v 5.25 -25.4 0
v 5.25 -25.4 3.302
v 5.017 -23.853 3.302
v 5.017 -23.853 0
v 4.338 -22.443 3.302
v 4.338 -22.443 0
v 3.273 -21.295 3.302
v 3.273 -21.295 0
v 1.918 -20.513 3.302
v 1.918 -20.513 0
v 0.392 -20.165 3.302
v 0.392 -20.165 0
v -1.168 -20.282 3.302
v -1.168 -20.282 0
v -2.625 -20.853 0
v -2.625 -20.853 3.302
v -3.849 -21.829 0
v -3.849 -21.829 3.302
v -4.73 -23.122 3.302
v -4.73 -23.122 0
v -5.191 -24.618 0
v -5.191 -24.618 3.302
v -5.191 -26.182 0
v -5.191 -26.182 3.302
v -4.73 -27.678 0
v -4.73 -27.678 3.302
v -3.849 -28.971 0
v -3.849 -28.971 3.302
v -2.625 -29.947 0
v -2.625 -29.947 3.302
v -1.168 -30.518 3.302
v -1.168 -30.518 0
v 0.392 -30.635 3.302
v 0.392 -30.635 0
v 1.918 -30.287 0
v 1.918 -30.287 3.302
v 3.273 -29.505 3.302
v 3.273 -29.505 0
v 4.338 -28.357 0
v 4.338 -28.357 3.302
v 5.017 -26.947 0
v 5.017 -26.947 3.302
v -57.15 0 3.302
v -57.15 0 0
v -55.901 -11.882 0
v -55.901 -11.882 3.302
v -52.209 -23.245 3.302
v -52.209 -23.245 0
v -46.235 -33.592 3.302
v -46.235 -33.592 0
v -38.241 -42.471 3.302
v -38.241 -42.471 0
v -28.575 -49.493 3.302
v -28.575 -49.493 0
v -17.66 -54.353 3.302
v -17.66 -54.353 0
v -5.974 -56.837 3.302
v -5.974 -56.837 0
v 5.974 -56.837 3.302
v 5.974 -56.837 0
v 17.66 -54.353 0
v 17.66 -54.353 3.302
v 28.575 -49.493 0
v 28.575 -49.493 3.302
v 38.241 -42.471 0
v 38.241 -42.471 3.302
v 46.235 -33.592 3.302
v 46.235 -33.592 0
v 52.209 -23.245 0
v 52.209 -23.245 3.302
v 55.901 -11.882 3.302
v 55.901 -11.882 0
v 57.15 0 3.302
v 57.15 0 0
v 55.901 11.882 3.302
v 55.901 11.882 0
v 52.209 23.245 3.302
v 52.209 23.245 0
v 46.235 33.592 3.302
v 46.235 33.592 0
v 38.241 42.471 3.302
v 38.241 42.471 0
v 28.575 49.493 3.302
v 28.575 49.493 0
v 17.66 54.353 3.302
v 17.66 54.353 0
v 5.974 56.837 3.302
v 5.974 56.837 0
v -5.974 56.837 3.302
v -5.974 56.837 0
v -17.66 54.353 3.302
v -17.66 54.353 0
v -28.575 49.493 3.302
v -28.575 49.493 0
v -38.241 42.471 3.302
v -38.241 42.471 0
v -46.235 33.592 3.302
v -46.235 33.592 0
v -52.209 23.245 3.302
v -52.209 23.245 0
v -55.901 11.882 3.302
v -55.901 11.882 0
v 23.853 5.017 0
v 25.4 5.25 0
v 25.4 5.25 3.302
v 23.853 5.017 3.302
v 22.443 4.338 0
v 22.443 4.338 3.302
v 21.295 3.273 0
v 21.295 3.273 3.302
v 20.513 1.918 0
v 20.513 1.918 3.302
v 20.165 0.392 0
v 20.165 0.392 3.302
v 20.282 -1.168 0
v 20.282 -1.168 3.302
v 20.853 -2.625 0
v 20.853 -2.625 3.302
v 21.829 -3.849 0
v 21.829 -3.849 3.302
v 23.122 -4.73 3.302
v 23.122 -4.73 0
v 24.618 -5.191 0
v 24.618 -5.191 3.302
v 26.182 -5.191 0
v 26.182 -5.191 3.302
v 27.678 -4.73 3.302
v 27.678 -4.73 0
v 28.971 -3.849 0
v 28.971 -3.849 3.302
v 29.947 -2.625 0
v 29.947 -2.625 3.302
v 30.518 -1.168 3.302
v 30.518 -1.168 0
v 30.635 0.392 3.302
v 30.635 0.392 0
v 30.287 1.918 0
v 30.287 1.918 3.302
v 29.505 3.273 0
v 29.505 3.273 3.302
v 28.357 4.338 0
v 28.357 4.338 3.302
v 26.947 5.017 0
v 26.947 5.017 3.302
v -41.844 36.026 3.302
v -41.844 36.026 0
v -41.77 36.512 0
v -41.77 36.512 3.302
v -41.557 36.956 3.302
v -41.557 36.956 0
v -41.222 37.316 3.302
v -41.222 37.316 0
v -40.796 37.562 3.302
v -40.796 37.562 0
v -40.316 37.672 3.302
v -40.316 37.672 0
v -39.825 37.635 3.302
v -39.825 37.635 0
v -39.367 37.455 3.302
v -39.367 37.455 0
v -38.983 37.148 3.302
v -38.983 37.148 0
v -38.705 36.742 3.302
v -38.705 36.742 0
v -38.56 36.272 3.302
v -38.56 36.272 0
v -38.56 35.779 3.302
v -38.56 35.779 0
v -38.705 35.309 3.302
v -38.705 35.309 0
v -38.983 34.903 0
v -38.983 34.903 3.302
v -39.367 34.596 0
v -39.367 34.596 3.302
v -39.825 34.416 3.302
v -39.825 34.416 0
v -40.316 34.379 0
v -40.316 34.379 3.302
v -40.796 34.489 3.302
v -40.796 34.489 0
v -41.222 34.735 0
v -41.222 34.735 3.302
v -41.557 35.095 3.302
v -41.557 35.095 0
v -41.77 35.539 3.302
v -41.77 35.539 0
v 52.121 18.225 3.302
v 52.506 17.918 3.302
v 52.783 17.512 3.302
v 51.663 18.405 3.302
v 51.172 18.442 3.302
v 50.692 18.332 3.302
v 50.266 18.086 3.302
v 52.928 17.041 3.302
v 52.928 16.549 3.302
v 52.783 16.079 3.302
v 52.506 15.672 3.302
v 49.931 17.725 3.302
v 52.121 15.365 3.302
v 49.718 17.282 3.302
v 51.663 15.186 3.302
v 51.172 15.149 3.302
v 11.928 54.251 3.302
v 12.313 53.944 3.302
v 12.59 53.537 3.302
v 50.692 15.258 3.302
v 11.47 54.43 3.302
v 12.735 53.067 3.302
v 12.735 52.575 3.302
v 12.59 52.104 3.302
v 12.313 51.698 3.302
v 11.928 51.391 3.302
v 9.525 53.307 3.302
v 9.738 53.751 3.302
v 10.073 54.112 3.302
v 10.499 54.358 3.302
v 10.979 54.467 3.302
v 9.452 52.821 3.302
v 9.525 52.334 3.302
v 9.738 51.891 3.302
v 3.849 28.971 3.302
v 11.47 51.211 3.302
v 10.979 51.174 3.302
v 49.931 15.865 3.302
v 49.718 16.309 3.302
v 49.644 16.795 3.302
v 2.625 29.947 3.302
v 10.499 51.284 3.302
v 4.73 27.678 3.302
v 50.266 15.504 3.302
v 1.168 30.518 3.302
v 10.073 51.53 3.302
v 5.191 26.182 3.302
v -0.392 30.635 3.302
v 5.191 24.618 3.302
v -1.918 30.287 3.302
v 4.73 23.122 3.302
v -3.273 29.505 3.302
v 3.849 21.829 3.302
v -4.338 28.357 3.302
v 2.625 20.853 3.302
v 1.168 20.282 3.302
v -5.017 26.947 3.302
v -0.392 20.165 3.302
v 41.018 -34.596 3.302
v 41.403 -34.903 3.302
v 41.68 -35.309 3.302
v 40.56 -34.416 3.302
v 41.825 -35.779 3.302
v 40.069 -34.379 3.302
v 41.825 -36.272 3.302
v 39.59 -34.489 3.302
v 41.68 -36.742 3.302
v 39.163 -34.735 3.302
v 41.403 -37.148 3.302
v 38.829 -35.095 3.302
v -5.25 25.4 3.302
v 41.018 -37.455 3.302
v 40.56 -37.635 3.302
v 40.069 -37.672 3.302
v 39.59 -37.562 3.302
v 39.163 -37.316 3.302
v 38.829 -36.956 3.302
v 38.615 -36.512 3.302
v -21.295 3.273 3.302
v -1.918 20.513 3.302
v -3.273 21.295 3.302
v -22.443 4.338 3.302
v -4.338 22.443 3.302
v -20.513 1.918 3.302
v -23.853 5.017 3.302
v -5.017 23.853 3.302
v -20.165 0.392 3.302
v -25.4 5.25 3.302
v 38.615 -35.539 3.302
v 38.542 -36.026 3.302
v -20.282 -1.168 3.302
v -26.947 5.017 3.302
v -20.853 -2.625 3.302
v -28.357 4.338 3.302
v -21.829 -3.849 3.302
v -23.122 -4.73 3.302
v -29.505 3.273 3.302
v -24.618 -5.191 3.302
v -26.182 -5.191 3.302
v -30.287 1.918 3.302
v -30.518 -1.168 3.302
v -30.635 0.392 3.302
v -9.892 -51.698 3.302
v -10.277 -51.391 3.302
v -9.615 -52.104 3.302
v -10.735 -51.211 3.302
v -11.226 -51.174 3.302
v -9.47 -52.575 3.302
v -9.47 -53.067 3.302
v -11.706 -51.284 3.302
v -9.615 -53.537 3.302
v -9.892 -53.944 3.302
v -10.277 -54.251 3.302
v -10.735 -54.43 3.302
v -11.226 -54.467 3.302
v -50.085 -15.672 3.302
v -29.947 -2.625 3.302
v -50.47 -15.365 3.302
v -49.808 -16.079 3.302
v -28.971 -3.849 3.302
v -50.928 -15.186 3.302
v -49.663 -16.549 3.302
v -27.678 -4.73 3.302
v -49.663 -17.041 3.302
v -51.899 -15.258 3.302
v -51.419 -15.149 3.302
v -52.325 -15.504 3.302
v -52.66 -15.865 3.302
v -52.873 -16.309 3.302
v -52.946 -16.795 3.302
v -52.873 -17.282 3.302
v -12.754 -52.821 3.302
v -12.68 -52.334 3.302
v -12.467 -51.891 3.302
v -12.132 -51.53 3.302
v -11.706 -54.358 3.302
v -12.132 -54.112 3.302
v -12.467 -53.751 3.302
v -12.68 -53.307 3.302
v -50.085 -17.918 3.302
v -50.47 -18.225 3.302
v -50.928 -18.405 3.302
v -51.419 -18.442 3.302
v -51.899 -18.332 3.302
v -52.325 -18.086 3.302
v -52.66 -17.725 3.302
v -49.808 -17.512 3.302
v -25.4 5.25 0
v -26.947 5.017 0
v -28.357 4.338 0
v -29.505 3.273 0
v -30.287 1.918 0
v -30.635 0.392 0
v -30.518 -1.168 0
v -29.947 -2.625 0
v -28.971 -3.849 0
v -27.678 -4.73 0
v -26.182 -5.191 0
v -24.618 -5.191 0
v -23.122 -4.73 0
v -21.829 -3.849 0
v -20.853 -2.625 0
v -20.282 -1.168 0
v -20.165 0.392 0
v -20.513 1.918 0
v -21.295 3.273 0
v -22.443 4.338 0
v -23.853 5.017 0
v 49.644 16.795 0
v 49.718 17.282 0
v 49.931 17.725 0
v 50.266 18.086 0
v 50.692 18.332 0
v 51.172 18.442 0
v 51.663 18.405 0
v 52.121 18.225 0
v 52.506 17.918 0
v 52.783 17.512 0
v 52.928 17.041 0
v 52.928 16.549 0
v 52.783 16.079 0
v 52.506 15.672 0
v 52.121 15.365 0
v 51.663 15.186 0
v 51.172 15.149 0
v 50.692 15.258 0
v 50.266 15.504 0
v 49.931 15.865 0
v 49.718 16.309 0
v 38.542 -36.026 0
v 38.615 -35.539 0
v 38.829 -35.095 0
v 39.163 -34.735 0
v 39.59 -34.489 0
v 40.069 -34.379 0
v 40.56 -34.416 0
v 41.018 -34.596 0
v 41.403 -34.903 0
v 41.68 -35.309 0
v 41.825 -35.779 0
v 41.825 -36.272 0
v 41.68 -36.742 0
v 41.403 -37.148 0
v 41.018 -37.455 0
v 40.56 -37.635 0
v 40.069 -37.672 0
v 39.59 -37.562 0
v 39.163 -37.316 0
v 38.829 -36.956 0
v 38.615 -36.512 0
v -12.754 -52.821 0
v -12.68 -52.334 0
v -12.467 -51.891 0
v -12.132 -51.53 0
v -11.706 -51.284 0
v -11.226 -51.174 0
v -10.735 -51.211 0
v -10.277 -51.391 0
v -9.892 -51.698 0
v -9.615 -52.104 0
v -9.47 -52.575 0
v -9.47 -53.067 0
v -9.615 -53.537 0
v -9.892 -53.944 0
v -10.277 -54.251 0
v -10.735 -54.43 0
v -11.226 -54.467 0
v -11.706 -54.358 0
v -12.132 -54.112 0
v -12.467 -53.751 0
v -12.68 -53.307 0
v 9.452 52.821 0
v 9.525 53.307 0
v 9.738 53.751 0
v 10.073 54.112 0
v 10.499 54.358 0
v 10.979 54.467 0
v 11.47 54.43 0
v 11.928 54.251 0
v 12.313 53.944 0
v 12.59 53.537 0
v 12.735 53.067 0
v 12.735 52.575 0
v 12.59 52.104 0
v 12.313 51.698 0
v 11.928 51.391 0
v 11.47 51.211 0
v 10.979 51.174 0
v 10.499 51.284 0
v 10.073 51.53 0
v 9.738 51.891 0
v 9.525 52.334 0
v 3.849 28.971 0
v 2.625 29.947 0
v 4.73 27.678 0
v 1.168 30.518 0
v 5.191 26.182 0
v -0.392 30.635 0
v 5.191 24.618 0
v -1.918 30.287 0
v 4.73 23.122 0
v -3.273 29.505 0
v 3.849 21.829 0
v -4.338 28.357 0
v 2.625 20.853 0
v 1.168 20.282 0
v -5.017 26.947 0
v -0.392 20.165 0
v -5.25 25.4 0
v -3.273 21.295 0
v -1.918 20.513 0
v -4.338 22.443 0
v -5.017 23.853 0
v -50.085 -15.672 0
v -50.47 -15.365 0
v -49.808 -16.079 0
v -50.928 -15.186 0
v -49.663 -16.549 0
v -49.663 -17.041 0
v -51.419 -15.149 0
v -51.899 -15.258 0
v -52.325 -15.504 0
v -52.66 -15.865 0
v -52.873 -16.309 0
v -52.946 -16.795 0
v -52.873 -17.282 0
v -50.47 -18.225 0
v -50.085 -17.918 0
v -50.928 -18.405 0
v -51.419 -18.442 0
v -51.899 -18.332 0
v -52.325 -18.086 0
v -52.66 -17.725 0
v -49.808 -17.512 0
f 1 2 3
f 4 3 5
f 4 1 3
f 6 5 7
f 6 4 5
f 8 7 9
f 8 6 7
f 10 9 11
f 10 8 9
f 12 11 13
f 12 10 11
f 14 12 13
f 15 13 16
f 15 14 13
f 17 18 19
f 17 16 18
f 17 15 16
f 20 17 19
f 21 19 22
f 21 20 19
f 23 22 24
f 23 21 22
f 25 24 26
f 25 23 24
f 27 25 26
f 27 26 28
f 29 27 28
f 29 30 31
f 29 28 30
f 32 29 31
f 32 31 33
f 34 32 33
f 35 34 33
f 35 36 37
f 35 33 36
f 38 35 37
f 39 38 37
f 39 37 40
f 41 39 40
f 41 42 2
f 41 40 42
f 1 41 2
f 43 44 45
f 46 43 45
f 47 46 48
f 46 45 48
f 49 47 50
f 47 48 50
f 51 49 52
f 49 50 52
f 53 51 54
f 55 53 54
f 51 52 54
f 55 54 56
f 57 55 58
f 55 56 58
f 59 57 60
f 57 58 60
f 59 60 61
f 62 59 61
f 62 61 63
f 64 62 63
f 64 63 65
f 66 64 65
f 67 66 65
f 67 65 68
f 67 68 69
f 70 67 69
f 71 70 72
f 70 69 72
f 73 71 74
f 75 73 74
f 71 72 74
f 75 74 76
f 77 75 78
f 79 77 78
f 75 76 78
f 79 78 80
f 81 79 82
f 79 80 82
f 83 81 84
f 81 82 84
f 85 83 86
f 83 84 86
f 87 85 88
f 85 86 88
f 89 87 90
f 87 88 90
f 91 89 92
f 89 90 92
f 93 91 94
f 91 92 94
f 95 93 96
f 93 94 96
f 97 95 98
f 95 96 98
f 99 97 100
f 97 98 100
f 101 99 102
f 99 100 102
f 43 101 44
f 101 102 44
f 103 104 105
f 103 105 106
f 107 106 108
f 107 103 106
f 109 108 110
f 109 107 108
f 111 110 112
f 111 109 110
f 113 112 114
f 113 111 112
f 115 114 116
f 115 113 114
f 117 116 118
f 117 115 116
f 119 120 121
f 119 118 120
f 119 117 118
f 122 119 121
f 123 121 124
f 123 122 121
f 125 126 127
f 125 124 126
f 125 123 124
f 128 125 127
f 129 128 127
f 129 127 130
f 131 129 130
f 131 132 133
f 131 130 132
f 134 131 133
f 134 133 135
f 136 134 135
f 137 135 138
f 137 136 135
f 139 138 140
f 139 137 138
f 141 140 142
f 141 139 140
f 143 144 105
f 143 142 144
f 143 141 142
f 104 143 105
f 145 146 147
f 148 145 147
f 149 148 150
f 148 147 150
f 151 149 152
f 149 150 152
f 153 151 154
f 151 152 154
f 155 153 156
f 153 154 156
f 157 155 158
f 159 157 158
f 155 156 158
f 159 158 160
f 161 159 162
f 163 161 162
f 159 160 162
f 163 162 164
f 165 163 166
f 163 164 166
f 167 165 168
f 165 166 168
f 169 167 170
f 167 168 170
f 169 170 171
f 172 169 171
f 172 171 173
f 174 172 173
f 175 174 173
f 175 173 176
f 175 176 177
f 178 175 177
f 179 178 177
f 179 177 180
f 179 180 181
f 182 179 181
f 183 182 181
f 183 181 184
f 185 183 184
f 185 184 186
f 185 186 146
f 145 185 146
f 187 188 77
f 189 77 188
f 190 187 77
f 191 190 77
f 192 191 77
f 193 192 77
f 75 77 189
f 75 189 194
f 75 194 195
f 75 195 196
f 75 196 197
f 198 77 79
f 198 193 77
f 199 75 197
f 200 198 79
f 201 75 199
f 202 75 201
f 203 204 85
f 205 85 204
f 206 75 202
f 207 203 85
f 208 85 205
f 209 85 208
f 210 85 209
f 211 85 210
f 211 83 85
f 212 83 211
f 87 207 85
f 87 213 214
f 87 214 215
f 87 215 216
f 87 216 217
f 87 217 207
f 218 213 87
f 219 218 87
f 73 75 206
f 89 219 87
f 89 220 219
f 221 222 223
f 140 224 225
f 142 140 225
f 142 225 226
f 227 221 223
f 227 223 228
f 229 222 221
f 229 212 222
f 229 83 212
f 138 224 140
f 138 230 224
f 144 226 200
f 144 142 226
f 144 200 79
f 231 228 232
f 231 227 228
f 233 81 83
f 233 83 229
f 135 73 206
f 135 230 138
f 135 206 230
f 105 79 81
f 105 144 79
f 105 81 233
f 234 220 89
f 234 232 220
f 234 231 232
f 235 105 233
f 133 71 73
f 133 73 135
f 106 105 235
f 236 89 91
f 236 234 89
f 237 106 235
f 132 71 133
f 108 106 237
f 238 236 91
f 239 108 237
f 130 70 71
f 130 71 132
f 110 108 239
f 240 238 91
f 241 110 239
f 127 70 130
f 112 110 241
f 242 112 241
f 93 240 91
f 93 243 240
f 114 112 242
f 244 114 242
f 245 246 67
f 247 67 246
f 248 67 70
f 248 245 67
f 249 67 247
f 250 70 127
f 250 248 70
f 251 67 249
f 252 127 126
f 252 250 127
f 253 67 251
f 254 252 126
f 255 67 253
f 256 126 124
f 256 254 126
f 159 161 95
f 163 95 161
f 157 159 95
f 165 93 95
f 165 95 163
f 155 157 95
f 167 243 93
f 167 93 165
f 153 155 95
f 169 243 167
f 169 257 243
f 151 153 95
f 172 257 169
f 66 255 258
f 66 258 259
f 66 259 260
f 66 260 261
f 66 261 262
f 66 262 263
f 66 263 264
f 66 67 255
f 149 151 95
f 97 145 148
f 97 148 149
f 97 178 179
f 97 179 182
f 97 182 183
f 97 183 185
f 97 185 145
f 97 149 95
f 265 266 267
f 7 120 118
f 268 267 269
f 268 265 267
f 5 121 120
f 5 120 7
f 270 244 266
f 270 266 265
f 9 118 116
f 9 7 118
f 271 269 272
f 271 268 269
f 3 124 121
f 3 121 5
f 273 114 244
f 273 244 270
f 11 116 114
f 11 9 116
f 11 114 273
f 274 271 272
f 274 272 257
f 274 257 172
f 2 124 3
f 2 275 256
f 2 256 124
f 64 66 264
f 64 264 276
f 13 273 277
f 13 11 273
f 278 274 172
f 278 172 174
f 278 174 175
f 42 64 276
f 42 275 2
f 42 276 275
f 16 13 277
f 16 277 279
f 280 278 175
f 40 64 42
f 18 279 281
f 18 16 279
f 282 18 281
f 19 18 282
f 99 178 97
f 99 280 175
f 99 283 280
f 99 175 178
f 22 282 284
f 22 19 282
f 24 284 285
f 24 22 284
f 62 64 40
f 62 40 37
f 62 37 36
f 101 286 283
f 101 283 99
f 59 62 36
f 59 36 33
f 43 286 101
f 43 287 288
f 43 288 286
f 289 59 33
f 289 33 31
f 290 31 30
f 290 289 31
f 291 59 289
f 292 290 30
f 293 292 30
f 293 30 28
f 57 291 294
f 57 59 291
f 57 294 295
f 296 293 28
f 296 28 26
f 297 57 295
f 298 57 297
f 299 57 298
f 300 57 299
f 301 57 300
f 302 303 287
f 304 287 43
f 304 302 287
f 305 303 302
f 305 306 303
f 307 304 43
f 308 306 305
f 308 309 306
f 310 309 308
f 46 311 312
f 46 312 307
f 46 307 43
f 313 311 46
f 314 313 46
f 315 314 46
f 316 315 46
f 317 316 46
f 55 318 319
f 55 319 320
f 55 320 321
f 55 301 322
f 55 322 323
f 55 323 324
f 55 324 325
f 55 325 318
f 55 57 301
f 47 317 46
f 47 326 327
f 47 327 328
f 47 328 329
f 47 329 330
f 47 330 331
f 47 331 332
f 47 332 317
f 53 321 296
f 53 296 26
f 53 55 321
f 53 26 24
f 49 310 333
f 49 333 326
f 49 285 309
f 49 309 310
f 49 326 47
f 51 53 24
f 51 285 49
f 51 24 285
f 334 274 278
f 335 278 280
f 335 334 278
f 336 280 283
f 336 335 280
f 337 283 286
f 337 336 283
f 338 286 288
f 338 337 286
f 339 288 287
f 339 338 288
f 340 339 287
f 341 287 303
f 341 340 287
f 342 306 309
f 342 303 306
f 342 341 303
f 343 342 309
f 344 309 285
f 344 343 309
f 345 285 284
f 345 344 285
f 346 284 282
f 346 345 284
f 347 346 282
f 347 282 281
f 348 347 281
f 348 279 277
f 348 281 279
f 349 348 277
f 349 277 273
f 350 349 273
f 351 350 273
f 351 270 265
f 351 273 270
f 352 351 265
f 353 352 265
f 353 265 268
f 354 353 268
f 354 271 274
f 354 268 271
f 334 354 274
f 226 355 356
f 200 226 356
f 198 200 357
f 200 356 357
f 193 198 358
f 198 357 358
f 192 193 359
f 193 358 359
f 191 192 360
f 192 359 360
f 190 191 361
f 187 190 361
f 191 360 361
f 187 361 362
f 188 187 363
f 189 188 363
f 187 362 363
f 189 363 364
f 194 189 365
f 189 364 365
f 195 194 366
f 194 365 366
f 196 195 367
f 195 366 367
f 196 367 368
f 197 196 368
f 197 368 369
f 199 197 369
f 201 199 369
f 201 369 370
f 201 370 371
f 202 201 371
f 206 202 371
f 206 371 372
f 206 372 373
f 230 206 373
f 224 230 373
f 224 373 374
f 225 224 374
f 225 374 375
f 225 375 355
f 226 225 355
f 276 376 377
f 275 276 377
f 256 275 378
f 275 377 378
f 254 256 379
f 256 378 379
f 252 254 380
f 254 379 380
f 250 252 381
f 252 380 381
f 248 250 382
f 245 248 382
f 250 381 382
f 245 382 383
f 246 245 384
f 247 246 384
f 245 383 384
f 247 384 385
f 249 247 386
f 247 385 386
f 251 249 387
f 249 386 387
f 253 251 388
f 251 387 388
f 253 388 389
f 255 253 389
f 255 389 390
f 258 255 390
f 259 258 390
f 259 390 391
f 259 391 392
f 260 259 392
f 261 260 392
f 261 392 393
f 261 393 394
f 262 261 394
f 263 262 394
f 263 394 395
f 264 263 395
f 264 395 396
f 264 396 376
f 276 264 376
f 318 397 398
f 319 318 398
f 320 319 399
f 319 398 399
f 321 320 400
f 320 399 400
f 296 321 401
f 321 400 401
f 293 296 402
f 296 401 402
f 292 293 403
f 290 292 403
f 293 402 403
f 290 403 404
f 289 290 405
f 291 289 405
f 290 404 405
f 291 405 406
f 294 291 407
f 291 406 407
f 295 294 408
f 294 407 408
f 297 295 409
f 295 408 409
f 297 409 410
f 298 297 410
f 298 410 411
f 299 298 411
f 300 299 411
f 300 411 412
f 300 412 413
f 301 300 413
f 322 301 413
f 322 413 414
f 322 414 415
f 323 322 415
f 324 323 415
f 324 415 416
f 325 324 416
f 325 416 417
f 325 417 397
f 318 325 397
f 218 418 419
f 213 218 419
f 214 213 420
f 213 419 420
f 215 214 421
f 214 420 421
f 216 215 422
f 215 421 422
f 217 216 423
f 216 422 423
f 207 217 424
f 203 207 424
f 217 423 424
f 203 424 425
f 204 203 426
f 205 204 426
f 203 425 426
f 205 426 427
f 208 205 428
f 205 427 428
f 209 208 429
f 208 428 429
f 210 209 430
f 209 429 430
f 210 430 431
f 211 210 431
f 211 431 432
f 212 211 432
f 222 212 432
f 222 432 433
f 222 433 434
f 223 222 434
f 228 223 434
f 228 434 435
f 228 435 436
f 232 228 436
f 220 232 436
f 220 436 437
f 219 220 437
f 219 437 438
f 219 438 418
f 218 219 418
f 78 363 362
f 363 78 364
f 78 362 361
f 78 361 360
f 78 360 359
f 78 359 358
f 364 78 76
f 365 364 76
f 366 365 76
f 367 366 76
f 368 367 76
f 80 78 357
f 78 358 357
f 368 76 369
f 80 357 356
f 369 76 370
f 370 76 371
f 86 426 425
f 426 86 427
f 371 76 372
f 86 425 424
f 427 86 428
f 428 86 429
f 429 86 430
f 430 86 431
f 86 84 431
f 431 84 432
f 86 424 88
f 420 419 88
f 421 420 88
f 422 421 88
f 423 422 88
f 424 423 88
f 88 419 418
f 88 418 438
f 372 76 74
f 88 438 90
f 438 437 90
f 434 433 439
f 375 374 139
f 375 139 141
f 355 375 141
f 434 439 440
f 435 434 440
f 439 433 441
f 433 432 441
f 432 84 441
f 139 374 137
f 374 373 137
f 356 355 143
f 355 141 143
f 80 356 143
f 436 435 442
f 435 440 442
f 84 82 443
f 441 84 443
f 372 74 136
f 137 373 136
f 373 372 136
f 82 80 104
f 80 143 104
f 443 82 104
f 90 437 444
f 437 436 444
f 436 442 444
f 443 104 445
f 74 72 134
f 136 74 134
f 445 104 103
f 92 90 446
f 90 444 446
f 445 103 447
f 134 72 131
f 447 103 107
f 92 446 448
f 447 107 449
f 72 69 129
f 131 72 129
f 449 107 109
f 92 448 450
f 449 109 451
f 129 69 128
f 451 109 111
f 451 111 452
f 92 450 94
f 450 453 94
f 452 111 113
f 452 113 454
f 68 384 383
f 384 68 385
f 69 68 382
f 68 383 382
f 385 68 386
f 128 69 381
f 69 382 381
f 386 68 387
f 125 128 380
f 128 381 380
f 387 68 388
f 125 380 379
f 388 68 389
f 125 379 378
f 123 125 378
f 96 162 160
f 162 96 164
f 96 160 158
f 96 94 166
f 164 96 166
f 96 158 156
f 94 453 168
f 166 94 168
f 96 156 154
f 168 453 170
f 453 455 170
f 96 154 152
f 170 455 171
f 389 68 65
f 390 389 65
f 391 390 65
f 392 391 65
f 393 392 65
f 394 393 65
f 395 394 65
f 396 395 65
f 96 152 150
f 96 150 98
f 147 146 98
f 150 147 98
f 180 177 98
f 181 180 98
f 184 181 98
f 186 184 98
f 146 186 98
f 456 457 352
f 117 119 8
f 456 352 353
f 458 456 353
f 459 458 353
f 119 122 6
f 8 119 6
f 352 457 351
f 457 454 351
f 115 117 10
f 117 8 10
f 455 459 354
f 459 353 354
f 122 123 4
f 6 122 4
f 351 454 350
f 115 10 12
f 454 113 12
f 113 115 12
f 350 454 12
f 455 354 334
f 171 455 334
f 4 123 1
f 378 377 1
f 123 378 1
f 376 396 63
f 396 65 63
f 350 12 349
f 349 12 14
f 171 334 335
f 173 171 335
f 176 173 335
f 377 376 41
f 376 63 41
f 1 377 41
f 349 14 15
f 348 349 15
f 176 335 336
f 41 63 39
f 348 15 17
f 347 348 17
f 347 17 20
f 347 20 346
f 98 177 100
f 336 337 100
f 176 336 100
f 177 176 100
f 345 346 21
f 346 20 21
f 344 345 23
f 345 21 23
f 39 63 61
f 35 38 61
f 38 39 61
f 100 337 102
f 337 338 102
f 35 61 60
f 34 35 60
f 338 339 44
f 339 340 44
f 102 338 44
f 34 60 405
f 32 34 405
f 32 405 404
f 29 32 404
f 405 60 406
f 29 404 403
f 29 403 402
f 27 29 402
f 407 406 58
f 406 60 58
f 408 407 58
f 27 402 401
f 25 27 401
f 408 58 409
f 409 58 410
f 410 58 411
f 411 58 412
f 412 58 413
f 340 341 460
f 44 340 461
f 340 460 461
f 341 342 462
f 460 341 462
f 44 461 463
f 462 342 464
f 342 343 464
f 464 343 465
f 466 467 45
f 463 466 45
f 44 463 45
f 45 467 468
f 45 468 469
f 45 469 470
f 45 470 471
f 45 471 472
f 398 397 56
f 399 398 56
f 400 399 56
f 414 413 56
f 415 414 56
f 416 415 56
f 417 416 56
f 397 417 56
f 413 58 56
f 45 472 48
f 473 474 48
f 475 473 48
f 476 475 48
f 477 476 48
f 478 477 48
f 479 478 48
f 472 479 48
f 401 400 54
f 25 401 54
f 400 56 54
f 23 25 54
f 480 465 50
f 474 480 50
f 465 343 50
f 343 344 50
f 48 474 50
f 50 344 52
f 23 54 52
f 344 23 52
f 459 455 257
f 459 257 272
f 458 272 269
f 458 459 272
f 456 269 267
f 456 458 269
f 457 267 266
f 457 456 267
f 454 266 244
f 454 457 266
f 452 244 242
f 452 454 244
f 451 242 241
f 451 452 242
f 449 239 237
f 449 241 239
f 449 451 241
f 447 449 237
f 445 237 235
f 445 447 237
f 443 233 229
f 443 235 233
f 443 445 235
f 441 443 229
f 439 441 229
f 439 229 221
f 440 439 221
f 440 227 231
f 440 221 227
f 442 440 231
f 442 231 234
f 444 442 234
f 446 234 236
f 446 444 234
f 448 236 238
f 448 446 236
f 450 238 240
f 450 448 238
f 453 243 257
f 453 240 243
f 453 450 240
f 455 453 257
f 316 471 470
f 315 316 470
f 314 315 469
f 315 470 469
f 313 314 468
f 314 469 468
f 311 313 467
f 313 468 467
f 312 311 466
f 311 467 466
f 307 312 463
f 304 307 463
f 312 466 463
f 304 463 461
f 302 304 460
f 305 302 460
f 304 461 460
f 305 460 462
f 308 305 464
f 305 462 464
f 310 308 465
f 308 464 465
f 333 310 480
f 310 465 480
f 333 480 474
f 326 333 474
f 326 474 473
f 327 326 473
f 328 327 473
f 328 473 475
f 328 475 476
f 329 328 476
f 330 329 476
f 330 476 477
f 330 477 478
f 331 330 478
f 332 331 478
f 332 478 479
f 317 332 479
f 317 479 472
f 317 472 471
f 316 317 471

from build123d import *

# Parameters (mm, degrees)
SKETCH_1_R                     = 57.15
EXTRUDE_1_DEPTH                = 3.302
SKETCH_2_R                     = 1.651
CUT_EXTRUDE_1_DEPTH            = 81.889728668
M10_CLEARANCE_HOLE1_AT_2_COUNT = 2
M10_CLEARANCE_HOLE1_AT_2_PITCH = 50.8
CIRPATTERN1_COUNT              = 4


with BuildPart() as part:
    # 草图1 → 凸台-拉伸1 (new body)
    with BuildSketch(Plane.XY):
        with Locations(Location((0, 0, 0), (0, 0, 180))):
            Circle(SKETCH_1_R)
    extrude(amount=EXTRUDE_1_DEPTH)

    # 草图2 → 切除-拉伸1 (cut, through all)
    with BuildSketch(Plane(origin=(0, 0, 0), x_dir=(-1, 0, 0), z_dir=(0, 0, -1))):
        with Locations((-51.295425161, 16.7952369)):
            Circle(SKETCH_2_R)
        with Locations((-11.102610763, 52.820759738)):
            Circle(SKETCH_2_R)
        with Locations((40.192814398, 36.025522838)):
            Circle(SKETCH_2_R)
        with Locations((51.295425161, -16.7952369)):
            Circle(SKETCH_2_R)
        with Locations((11.102610763, -52.820759738)):
            Circle(SKETCH_2_R)
        with Locations((-40.192814398, -36.025522838)):
            Circle(SKETCH_2_R)
    extrude(amount=-CUT_EXTRUDE_1_DEPTH, mode=Mode.SUBTRACT)

    # Sketch3 → M10 Clearance Hole1 (revolve, cut)
    with BuildSketch(Plane.YZ.offset(25.4)):
        Polygon((0, 0), (0, 28.55451825), (5.25, 25.4), (5.25, 0), align=None)
    m10_clearance_hole1 = revolve(axis=Axis((25.4, 0, -6.35), (0, 0, 1)), mode=Mode.SUBTRACT)

    # M10 Clearance Hole1 at 2: M10 Clearance Hole1 ×2
    with Locations(*[(-i * M10_CLEARANCE_HOLE1_AT_2_PITCH, 0, 0) for i in range(1, M10_CLEARANCE_HOLE1_AT_2_COUNT)]):
        add(m10_clearance_hole1, mode=Mode.SUBTRACT)

    # CirPattern1: M10 Clearance Hole1 ×4 about axis
    cirpattern1_axis = Axis((0, 0, 0), (0, 0, 1))
    for i in range(1, CIRPATTERN1_COUNT):
        add(m10_clearance_hole1.rotate(cirpattern1_axis, i * 360 / CIRPATTERN1_COUNT), mode=Mode.SUBTRACT)

    # CirPattern1 copy 1 sketch → CirPattern1 copy 1 (revolve, cut)
    with BuildSketch(Plane(origin=(0, -25.4, 0), x_dir=(-1, 0, 0), z_dir=(0, 1, 0))):
        Polygon((0, 0), (0, 28.55451825), (5.25, 25.4), (5.25, 0), align=None)
    revolve(axis=Axis((0, -25.4, -6.35), (0, 0, 1)), mode=Mode.SUBTRACT)

    # CirPattern1 copy 2 sketch → CirPattern1 copy 2 (revolve, cut)
    with BuildSketch(Plane(origin=(25.4, 0, 0), x_dir=(0, -1, 0), z_dir=(-1, 0, 0))):
        Polygon((0, 0), (0, 28.55451825), (5.25, 25.4), (5.25, 0), align=None)
    revolve(axis=Axis((25.4, 0, -6.35), (0, 0, 1)), mode=Mode.SUBTRACT)

    # CirPattern1 copy 3 sketch → CirPattern1 copy 3 (revolve, cut)
    with BuildSketch(Plane.XZ.offset(-25.4)):
        Polygon((0, 0), (0, 28.55451825), (5.25, 25.4), (5.25, 0), align=None)
    revolve(axis=Axis((0, 25.4, -6.35), (0, 0, 1)), mode=Mode.SUBTRACT)


solid = part.part
